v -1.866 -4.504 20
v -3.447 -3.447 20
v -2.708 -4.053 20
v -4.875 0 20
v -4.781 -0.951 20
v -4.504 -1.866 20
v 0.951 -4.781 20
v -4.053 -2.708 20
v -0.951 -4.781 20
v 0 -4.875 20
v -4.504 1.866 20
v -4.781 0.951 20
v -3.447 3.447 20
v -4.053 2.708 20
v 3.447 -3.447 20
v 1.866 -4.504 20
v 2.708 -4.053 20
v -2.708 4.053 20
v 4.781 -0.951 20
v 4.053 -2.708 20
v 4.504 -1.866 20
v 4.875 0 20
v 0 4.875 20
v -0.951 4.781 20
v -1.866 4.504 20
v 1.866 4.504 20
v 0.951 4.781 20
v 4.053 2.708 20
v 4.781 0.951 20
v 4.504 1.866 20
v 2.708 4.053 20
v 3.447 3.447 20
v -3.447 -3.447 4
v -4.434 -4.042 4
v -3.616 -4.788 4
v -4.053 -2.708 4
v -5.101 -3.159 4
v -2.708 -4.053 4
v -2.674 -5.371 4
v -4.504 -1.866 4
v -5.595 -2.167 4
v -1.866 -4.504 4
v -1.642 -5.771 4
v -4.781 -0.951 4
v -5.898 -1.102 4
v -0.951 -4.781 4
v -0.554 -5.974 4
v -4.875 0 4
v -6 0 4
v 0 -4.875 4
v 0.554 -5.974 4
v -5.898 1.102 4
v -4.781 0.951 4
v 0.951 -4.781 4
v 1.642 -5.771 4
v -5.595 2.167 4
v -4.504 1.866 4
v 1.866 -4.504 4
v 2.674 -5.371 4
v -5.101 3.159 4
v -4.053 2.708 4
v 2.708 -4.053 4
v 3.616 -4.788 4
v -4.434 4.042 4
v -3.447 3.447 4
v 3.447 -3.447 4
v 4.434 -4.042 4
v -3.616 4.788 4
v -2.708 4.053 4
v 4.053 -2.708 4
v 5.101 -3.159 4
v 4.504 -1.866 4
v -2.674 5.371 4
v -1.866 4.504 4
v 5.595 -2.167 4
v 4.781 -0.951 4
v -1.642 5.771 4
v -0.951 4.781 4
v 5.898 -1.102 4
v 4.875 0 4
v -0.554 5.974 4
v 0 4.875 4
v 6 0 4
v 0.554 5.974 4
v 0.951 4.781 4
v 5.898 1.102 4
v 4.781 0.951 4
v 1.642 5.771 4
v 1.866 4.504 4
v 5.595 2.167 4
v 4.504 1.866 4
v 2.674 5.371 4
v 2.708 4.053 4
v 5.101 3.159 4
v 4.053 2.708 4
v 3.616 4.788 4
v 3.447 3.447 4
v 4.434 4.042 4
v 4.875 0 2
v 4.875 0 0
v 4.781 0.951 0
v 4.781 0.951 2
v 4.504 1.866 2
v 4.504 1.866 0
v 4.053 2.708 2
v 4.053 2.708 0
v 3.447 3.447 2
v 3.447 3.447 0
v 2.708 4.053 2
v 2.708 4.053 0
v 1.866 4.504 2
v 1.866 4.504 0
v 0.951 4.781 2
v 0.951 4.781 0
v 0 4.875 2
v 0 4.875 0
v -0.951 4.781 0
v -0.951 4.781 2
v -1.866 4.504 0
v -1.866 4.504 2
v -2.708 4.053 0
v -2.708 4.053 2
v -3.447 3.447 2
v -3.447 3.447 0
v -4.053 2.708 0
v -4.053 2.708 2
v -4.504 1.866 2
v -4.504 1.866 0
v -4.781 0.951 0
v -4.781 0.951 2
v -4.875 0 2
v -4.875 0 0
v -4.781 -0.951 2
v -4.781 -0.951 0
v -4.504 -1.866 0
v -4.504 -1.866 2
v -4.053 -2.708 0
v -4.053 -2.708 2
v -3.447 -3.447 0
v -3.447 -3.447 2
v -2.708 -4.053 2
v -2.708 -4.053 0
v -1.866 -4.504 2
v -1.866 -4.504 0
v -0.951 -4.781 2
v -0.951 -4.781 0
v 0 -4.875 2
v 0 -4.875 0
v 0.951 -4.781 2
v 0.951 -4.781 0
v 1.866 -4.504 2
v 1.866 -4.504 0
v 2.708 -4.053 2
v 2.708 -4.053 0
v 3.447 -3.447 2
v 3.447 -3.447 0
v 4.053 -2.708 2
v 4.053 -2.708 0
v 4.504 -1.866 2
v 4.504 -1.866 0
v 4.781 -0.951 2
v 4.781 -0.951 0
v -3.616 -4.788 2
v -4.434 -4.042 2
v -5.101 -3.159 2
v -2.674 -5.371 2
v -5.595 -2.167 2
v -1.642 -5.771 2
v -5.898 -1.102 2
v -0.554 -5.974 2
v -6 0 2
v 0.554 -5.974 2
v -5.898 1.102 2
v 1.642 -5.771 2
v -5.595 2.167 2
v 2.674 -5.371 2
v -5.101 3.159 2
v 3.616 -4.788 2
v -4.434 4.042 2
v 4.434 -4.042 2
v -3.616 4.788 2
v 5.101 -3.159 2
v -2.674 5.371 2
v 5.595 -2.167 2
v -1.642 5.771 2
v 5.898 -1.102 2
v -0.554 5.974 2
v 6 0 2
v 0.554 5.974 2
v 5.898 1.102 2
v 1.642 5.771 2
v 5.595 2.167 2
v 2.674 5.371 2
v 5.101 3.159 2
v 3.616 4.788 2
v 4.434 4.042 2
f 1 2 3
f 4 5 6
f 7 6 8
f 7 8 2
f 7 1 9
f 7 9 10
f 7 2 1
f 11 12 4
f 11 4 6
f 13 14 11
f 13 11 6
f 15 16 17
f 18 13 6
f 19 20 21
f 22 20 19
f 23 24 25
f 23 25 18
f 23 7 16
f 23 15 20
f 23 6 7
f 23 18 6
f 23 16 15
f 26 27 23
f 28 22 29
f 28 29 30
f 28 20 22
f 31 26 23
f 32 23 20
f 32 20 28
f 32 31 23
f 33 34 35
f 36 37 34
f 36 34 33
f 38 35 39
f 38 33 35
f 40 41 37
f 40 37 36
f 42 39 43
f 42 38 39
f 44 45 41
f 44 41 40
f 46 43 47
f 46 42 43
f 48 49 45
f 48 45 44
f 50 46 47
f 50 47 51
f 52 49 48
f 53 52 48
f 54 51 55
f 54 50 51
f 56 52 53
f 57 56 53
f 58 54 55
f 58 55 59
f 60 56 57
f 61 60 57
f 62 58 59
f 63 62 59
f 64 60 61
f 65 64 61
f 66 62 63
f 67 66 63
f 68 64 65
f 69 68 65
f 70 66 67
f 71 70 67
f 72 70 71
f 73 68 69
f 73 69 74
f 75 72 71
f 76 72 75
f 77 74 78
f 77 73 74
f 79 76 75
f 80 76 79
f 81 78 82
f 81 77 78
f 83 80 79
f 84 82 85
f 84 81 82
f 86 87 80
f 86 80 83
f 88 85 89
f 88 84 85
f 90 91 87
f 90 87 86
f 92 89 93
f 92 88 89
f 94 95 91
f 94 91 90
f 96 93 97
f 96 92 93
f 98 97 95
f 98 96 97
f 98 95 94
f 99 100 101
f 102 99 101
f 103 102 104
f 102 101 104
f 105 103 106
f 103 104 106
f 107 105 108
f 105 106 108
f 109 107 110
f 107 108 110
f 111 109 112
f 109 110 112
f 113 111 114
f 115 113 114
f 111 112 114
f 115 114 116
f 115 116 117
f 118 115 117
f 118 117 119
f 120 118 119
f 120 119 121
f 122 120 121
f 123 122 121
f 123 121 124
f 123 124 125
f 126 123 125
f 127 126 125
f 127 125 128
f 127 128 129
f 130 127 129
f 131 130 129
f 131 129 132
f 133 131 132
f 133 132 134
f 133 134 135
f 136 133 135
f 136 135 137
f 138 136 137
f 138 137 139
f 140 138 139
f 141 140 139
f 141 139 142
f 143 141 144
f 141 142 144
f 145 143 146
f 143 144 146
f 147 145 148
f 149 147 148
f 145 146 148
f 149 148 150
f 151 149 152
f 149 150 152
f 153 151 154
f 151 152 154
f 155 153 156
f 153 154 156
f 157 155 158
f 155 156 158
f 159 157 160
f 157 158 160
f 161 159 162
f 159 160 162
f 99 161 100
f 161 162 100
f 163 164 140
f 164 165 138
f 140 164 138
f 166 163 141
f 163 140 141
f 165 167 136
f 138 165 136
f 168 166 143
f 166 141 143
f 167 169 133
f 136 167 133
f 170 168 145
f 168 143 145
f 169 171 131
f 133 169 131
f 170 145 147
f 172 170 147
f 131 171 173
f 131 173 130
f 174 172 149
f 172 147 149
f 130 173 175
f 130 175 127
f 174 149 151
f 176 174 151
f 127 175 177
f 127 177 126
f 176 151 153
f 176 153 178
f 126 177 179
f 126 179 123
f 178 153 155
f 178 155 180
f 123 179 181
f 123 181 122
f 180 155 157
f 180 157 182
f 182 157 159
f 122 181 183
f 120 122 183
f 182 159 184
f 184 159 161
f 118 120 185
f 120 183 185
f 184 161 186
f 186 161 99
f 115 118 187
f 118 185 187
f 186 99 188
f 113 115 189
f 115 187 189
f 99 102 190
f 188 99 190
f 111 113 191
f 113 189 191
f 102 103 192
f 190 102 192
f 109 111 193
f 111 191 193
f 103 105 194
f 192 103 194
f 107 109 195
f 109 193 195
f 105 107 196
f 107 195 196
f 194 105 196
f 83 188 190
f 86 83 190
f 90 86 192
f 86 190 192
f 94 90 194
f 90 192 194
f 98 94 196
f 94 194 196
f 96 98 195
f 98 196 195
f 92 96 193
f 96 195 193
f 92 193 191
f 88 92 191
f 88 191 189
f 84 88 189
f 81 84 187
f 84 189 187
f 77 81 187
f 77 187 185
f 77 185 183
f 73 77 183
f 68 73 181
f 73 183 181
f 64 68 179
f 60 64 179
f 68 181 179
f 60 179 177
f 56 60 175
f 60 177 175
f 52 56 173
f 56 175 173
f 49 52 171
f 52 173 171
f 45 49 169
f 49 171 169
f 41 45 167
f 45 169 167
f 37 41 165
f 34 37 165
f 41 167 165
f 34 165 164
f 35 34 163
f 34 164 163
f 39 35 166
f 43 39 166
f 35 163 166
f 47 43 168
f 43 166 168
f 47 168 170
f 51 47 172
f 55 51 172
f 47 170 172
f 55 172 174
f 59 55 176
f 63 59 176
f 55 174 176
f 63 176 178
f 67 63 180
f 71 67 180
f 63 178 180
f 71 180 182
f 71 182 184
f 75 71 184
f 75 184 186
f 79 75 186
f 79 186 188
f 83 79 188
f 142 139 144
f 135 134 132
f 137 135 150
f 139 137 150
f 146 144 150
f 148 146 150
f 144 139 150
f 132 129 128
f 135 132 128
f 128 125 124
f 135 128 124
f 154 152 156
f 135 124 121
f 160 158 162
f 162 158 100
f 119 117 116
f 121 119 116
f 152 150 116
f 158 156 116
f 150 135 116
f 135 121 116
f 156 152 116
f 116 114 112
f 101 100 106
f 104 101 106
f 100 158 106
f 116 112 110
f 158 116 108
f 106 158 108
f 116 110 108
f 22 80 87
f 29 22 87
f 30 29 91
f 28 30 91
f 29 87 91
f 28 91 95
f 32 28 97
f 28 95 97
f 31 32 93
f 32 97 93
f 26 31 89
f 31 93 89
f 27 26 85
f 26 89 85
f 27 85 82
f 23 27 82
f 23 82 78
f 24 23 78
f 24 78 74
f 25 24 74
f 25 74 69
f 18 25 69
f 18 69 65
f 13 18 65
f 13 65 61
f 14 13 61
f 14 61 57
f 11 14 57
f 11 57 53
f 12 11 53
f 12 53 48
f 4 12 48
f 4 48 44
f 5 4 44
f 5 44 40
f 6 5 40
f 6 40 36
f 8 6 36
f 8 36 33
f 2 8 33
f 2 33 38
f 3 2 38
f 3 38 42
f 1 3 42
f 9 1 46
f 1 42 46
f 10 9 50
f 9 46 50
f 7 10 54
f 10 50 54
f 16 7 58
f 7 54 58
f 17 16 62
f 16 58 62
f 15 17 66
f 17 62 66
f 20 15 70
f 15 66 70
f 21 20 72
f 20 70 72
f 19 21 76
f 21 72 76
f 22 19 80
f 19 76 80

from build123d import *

# Parameters (mm, degrees)
F0_R     = 4.875
F1_DEPTH = 20
F2_START = 2
F0_R_2   = 6
F2_DEPTH = 2


with BuildPart() as f1:
    # F0 (on Top) → F1 (new body)
    with BuildSketch(Plane.XY):
        Circle(F0_R)
    extrude(amount=F1_DEPTH)

    # F0 (on Top) → F2 (join)
    with BuildSketch(Plane.XY.offset(F2_START)):
        Circle(F0_R_2)
        Circle(F0_R, mode=Mode.SUBTRACT)
    extrude(amount=F2_DEPTH)


solid = f1.part
